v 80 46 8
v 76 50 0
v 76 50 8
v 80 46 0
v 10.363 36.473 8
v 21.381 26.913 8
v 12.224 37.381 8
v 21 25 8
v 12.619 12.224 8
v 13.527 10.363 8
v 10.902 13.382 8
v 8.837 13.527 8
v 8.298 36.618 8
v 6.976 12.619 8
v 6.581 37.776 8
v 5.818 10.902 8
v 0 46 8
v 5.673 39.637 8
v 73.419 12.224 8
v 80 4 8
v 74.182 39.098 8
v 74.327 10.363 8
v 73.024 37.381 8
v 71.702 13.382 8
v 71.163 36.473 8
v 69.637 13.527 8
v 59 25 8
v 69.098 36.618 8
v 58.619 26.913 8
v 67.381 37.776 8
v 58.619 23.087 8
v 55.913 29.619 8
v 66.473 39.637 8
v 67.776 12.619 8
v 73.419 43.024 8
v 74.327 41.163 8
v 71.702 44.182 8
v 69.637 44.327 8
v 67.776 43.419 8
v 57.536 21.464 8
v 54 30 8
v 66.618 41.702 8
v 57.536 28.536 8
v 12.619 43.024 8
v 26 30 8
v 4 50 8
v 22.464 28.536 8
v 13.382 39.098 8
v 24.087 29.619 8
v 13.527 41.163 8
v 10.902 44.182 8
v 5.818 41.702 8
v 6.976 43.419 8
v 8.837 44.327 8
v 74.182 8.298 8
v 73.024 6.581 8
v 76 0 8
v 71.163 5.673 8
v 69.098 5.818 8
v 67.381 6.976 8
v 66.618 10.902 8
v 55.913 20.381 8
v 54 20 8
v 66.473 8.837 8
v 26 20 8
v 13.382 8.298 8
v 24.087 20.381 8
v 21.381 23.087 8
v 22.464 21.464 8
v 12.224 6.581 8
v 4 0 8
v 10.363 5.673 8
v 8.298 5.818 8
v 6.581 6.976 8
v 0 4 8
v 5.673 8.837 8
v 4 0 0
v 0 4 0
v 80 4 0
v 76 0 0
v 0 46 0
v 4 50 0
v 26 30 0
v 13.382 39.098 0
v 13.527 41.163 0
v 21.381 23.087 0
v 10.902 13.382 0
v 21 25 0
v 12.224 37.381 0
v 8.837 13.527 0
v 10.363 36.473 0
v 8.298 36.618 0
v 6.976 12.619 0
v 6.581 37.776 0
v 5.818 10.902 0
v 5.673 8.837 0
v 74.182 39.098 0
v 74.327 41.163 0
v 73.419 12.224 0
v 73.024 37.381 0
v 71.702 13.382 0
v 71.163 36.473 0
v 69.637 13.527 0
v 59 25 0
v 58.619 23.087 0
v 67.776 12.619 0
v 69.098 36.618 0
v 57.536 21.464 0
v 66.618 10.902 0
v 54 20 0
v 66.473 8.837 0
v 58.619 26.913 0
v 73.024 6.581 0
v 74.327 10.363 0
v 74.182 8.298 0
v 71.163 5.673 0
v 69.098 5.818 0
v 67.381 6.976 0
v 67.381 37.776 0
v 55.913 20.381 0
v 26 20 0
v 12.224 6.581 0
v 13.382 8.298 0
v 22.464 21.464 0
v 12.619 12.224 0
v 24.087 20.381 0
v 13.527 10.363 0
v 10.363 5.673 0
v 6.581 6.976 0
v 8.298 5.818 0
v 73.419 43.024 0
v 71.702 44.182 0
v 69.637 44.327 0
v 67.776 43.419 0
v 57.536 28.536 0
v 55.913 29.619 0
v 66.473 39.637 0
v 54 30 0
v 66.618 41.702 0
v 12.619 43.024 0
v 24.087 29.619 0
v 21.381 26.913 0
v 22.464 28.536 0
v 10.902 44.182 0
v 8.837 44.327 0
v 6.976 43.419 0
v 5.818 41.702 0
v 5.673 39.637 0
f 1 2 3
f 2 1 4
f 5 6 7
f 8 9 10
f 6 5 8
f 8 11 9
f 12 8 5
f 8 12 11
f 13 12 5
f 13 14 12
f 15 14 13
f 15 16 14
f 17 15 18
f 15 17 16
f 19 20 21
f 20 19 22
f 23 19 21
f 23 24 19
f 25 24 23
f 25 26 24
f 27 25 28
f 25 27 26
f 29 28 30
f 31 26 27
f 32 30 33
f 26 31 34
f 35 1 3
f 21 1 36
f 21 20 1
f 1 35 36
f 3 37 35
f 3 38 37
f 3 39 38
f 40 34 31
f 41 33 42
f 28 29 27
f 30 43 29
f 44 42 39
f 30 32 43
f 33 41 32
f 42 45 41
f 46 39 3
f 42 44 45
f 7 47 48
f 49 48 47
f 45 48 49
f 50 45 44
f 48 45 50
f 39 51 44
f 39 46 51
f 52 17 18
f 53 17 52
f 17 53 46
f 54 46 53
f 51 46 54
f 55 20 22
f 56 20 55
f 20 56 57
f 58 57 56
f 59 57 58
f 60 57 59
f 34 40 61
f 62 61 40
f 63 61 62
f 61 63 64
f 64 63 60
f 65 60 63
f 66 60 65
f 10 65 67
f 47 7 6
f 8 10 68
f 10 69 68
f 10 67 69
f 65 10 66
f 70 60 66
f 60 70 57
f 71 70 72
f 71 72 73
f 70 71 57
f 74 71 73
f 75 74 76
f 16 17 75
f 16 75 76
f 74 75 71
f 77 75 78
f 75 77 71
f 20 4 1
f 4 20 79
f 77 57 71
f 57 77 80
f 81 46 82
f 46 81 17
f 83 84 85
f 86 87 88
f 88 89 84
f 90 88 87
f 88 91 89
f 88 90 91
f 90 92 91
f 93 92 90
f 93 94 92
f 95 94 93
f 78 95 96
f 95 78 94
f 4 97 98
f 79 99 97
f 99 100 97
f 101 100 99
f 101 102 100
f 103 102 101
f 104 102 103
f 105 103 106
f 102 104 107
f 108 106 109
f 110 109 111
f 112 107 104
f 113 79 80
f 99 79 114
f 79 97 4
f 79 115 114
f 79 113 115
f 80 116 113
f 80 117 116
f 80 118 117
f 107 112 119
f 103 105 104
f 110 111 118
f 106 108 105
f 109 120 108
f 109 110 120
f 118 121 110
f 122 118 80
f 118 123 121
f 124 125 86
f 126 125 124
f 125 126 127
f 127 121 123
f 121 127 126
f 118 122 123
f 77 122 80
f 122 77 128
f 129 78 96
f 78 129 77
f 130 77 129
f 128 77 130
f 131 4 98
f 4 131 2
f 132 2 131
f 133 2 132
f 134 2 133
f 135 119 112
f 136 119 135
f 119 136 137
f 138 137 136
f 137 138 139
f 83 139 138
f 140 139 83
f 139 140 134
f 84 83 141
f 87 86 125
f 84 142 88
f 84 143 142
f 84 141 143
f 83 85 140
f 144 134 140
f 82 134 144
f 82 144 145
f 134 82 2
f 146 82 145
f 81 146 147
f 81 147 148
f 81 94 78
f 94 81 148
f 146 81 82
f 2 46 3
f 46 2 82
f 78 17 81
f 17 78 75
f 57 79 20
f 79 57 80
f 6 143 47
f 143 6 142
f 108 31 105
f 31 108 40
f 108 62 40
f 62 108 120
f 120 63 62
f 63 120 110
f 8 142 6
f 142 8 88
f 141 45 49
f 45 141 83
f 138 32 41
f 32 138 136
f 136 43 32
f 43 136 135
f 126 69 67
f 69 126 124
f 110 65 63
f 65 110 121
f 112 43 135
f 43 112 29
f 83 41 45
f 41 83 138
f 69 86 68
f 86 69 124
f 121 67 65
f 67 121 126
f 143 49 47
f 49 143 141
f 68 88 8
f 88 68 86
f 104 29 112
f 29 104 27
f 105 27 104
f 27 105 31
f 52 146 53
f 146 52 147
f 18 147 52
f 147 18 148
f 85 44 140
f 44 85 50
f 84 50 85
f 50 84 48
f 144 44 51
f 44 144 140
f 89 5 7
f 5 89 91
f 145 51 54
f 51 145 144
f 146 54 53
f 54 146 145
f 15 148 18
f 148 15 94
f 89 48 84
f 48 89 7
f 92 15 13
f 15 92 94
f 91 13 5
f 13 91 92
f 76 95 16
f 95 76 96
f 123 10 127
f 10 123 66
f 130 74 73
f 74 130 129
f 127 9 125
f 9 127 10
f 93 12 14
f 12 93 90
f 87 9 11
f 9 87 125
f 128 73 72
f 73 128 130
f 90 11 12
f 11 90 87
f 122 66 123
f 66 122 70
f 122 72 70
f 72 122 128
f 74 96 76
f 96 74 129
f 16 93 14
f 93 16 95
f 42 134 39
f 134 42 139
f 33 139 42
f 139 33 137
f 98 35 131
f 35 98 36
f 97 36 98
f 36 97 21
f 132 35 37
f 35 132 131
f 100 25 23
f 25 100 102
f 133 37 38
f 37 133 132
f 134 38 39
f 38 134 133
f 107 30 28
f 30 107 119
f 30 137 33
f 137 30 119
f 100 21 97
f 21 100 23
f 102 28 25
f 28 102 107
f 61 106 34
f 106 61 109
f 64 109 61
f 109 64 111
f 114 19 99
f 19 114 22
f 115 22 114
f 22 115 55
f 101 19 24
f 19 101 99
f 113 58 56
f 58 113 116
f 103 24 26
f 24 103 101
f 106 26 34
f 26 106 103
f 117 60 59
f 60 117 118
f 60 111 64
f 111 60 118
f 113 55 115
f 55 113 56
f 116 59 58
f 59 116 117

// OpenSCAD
$fn = 32;

// ----------------------------------------------------------------------
// Bracket plate: slot plate 80 x 50
// ----------------------------------------------------------------------

// --- parameters (mm) ---
hole_r = 4;               // bolt hole radius
plate_t = 8;              // plate thickness, Z (extrusion height)
plate_l = 80;             // plate length
plate_w = 50;             // plate width
slot_l = 28;              // slot straight length
slot_r = 5;               // slot end radius

slot_len = slot_l + 2 * slot_r;
slot_w = 2 * slot_r;
hole_d2 = 2 * hole_r;

profile = [[4, 0], [76, 0], [80, 4], [80, 46], [76, 50], [4, 50], [0, 46], [0, 4]];  // primary outline, 8 points, counter clockwise
void_1 = [[54, 20], [55.913, 20.381], [57.536, 21.464], [58.619, 23.087], [59, 25], [58.619, 26.913], [57.536, 28.536], [55.913, 29.619], [54, 30], [26, 30], [24.087, 29.619], [22.464, 28.536], [21.381, 26.913], [21, 25], [21.381, 23.087], [22.464, 21.464], [24.087, 20.381], [26, 20]];  // grip slot, 18 points
void_2 = [[13.527, 41.163], [12.619, 43.024], [10.902, 44.182], [8.837, 44.327], [6.976, 43.419], [5.818, 41.702], [5.673, 39.637], [6.581, 37.776], [8.298, 36.618], [10.363, 36.473], [12.224, 37.381], [13.382, 39.098]];  // corner hole, 12 points
void_3 = [[13.527, 10.363], [12.619, 12.224], [10.902, 13.382], [8.837, 13.527], [6.976, 12.619], [5.818, 10.902], [5.673, 8.837], [6.581, 6.976], [8.298, 5.818], [10.363, 5.673], [12.224, 6.581], [13.382, 8.298]];  // corner hole, 12 points
void_4 = [[74.327, 41.163], [73.419, 43.024], [71.702, 44.182], [69.637, 44.327], [67.776, 43.419], [66.618, 41.702], [66.473, 39.637], [67.381, 37.776], [69.098, 36.618], [71.163, 36.473], [73.024, 37.381], [74.182, 39.098]];  // corner hole, 12 points
void_5 = [[74.327, 10.363], [73.419, 12.224], [71.702, 13.382], [69.637, 13.527], [67.776, 12.619], [66.618, 10.902], [66.473, 8.837], [67.381, 6.976], [69.098, 5.818], [71.163, 5.673], [73.024, 6.581], [74.182, 8.298]];  // corner hole, 12 points

// --- the one profile operation ---
difference() {
  linear_extrude(height = plate_t) polygon(points = profile);
  translate([0, 0, -1])
    linear_extrude(height = plate_t + 2) polygon(points = void_1);
  translate([0, 0, -1])
    linear_extrude(height = plate_t + 2) polygon(points = void_2);
  translate([0, 0, -1])
    linear_extrude(height = plate_t + 2) polygon(points = void_3);
  translate([0, 0, -1])
    linear_extrude(height = plate_t + 2) polygon(points = void_4);
  translate([0, 0, -1])
    linear_extrude(height = plate_t + 2) polygon(points = void_5);
}
